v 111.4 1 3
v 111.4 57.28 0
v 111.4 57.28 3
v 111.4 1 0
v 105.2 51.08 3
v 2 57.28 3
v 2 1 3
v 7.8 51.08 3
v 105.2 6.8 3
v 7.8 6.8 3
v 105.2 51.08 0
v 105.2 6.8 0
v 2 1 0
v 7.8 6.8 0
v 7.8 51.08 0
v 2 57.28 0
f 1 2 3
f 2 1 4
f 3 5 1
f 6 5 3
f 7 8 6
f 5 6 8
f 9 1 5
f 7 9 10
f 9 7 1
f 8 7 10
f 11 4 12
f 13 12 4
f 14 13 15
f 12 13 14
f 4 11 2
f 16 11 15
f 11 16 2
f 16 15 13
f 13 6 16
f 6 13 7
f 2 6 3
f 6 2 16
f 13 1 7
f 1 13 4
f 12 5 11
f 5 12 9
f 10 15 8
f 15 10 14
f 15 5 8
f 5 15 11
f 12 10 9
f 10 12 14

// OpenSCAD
//parametros
lMin = 58;
lMax = 64.88; //63
comp = 117;
altura = 2;
bordaL = 15;

//makePrincipal();
makeTopo();
//makeTela();
//makeTelaFechada();


// --------------------------------------------
module makePrincipal(addEncaixe = true) {
    difference() {
    union() {
        orelha();
        
        body();
        if (addEncaixe == true) addEncaixe();

        color("blue")
        translate([6,5,1])
        honeycomb(comp-bordaL, lMax-bordaL, altura, 2, 0.8); 
    }

    bodyCorte();
    }
}

module makeTopo() {
    //color("black")
    //translate([0,0,2])
    bodyTopo();
}

module makeTela() {
    makePrincipal(false);
}

module makeTelaFechada() {
    bodyExterno();
}


module orelha() {
translate([comp-5,(lMin/2),0])
difference() {
    cylinder(h=altura, r=20/2, $fn=60);
    
    translate([-30,-15,-1])
    cube([30,30,5]);
}
}

module addEncaixe() {
iMax = lMax - bordaL - (4+2);
icomp = comp - bordaL - 5;

union() {
    difference() {

    color("red")
    translate([bordaL-(9-2),bordaL-(10-2),0])
    cube([icomp,iMax,15]);

    color("blue")
    translate([bordaL-(9-4),bordaL-(10-4),-2])
    cube([icomp - 4,iMax - 4,19]);

    }
    
//traves
translate([bordaL+25,bordaL-(10-2),0])
cube([0.8,iMax,15]);

translate([bordaL+60,bordaL-(10-2),0])
cube([0.8,iMax,15]);

translate([bordaL-7,(lMin/2),0])
cube([icomp,0.8,15]);
}
    
}


module bodyTopo() {
iMax = lMax - bordaL - (4+2) + 2.4;
icomp = comp - bordaL - 5 + 2.4;

difference() {

color("red")
translate([bordaL-13,bordaL-14,0])
cube([icomp+10,iMax+10,3]);

color("blue")
translate([bordaL-7.2,bordaL-8.2,-2])
cube([icomp-2,iMax-2,6]);

}
    
}

module bodyCorte() {
    brd = 5;
    dDif = 2;
    eDif = 11.9;
    
    translate([0,0,-1])
    rotate([0,-1,0]) {
        translate([-2,-dDif,2])
        cube([lMax+2,brd+dDif,altura*2]);

        translate([-2,lMax-eDif,2])
        cube([lMax+2,brd+dDif,altura*2]);
    }
}

module body() {
    difference() {
        bodyExterno();
        bodyInterno();
    }
}

module bodyExterno() {
    linear_extrude(height=altura, center=false, convexity=10)
    polygon_body();
}

module bodyInterno() {
    iMax = lMax - bordaL - (4+2);
    icomp = comp - bordaL - 5;

    translate([bordaL-(9-2),bordaL-(10-2),-1])
    cube([icomp,iMax,altura*2]);
}

module cruzado() {
    color("red")
    cube([5,comp,altura]);
}

module polygon_body(diferenca = 0) {
    diferenca = diferenca * 2;
    lMin = (lMin - diferenca);
    lMax = (lMax - diferenca);
    comp = 117 - (diferenca * 1.2);
    lDif = (lMax - lMin) / 2;

    polygon([[0,0],[comp,-lDif],[comp,lMin+lDif],[0,lMin]]);
}






module hc_column(length, cell_size, wall_thickness) {
        no_of_cells = floor(length / (cell_size + wall_thickness)) ;

        for (i = [0 : no_of_cells]) {
                translate([0,(i * (cell_size + wall_thickness)),0])
                         circle($fn = 6, r = cell_size * (sqrt(3)/3));
        }
}

module honeycomb (length, width, height, cell_size, wall_thickness) {
        no_of_rows = floor(1.2 * length / (cell_size +
wall_thickness)) ;

        tr_mod = cell_size + wall_thickness;
        tr_x = sqrt(3)/2 * tr_mod;
        tr_y = tr_mod / 2;
        off_x = -1 * wall_thickness / 2;
        off_y = wall_thickness / 2;
        linear_extrude(height = height, center = true, convexity = 10,
twist = 0, slices = 1)
                difference(){
                        square([length, width]);
                        for (i = [0 : no_of_rows]) {
                                translate([i * tr_x + off_x, (i % 2) *
tr_y + off_y,0])
                                        hc_column(width, cell_size,
wall_thickness);
                        }
                }
}
